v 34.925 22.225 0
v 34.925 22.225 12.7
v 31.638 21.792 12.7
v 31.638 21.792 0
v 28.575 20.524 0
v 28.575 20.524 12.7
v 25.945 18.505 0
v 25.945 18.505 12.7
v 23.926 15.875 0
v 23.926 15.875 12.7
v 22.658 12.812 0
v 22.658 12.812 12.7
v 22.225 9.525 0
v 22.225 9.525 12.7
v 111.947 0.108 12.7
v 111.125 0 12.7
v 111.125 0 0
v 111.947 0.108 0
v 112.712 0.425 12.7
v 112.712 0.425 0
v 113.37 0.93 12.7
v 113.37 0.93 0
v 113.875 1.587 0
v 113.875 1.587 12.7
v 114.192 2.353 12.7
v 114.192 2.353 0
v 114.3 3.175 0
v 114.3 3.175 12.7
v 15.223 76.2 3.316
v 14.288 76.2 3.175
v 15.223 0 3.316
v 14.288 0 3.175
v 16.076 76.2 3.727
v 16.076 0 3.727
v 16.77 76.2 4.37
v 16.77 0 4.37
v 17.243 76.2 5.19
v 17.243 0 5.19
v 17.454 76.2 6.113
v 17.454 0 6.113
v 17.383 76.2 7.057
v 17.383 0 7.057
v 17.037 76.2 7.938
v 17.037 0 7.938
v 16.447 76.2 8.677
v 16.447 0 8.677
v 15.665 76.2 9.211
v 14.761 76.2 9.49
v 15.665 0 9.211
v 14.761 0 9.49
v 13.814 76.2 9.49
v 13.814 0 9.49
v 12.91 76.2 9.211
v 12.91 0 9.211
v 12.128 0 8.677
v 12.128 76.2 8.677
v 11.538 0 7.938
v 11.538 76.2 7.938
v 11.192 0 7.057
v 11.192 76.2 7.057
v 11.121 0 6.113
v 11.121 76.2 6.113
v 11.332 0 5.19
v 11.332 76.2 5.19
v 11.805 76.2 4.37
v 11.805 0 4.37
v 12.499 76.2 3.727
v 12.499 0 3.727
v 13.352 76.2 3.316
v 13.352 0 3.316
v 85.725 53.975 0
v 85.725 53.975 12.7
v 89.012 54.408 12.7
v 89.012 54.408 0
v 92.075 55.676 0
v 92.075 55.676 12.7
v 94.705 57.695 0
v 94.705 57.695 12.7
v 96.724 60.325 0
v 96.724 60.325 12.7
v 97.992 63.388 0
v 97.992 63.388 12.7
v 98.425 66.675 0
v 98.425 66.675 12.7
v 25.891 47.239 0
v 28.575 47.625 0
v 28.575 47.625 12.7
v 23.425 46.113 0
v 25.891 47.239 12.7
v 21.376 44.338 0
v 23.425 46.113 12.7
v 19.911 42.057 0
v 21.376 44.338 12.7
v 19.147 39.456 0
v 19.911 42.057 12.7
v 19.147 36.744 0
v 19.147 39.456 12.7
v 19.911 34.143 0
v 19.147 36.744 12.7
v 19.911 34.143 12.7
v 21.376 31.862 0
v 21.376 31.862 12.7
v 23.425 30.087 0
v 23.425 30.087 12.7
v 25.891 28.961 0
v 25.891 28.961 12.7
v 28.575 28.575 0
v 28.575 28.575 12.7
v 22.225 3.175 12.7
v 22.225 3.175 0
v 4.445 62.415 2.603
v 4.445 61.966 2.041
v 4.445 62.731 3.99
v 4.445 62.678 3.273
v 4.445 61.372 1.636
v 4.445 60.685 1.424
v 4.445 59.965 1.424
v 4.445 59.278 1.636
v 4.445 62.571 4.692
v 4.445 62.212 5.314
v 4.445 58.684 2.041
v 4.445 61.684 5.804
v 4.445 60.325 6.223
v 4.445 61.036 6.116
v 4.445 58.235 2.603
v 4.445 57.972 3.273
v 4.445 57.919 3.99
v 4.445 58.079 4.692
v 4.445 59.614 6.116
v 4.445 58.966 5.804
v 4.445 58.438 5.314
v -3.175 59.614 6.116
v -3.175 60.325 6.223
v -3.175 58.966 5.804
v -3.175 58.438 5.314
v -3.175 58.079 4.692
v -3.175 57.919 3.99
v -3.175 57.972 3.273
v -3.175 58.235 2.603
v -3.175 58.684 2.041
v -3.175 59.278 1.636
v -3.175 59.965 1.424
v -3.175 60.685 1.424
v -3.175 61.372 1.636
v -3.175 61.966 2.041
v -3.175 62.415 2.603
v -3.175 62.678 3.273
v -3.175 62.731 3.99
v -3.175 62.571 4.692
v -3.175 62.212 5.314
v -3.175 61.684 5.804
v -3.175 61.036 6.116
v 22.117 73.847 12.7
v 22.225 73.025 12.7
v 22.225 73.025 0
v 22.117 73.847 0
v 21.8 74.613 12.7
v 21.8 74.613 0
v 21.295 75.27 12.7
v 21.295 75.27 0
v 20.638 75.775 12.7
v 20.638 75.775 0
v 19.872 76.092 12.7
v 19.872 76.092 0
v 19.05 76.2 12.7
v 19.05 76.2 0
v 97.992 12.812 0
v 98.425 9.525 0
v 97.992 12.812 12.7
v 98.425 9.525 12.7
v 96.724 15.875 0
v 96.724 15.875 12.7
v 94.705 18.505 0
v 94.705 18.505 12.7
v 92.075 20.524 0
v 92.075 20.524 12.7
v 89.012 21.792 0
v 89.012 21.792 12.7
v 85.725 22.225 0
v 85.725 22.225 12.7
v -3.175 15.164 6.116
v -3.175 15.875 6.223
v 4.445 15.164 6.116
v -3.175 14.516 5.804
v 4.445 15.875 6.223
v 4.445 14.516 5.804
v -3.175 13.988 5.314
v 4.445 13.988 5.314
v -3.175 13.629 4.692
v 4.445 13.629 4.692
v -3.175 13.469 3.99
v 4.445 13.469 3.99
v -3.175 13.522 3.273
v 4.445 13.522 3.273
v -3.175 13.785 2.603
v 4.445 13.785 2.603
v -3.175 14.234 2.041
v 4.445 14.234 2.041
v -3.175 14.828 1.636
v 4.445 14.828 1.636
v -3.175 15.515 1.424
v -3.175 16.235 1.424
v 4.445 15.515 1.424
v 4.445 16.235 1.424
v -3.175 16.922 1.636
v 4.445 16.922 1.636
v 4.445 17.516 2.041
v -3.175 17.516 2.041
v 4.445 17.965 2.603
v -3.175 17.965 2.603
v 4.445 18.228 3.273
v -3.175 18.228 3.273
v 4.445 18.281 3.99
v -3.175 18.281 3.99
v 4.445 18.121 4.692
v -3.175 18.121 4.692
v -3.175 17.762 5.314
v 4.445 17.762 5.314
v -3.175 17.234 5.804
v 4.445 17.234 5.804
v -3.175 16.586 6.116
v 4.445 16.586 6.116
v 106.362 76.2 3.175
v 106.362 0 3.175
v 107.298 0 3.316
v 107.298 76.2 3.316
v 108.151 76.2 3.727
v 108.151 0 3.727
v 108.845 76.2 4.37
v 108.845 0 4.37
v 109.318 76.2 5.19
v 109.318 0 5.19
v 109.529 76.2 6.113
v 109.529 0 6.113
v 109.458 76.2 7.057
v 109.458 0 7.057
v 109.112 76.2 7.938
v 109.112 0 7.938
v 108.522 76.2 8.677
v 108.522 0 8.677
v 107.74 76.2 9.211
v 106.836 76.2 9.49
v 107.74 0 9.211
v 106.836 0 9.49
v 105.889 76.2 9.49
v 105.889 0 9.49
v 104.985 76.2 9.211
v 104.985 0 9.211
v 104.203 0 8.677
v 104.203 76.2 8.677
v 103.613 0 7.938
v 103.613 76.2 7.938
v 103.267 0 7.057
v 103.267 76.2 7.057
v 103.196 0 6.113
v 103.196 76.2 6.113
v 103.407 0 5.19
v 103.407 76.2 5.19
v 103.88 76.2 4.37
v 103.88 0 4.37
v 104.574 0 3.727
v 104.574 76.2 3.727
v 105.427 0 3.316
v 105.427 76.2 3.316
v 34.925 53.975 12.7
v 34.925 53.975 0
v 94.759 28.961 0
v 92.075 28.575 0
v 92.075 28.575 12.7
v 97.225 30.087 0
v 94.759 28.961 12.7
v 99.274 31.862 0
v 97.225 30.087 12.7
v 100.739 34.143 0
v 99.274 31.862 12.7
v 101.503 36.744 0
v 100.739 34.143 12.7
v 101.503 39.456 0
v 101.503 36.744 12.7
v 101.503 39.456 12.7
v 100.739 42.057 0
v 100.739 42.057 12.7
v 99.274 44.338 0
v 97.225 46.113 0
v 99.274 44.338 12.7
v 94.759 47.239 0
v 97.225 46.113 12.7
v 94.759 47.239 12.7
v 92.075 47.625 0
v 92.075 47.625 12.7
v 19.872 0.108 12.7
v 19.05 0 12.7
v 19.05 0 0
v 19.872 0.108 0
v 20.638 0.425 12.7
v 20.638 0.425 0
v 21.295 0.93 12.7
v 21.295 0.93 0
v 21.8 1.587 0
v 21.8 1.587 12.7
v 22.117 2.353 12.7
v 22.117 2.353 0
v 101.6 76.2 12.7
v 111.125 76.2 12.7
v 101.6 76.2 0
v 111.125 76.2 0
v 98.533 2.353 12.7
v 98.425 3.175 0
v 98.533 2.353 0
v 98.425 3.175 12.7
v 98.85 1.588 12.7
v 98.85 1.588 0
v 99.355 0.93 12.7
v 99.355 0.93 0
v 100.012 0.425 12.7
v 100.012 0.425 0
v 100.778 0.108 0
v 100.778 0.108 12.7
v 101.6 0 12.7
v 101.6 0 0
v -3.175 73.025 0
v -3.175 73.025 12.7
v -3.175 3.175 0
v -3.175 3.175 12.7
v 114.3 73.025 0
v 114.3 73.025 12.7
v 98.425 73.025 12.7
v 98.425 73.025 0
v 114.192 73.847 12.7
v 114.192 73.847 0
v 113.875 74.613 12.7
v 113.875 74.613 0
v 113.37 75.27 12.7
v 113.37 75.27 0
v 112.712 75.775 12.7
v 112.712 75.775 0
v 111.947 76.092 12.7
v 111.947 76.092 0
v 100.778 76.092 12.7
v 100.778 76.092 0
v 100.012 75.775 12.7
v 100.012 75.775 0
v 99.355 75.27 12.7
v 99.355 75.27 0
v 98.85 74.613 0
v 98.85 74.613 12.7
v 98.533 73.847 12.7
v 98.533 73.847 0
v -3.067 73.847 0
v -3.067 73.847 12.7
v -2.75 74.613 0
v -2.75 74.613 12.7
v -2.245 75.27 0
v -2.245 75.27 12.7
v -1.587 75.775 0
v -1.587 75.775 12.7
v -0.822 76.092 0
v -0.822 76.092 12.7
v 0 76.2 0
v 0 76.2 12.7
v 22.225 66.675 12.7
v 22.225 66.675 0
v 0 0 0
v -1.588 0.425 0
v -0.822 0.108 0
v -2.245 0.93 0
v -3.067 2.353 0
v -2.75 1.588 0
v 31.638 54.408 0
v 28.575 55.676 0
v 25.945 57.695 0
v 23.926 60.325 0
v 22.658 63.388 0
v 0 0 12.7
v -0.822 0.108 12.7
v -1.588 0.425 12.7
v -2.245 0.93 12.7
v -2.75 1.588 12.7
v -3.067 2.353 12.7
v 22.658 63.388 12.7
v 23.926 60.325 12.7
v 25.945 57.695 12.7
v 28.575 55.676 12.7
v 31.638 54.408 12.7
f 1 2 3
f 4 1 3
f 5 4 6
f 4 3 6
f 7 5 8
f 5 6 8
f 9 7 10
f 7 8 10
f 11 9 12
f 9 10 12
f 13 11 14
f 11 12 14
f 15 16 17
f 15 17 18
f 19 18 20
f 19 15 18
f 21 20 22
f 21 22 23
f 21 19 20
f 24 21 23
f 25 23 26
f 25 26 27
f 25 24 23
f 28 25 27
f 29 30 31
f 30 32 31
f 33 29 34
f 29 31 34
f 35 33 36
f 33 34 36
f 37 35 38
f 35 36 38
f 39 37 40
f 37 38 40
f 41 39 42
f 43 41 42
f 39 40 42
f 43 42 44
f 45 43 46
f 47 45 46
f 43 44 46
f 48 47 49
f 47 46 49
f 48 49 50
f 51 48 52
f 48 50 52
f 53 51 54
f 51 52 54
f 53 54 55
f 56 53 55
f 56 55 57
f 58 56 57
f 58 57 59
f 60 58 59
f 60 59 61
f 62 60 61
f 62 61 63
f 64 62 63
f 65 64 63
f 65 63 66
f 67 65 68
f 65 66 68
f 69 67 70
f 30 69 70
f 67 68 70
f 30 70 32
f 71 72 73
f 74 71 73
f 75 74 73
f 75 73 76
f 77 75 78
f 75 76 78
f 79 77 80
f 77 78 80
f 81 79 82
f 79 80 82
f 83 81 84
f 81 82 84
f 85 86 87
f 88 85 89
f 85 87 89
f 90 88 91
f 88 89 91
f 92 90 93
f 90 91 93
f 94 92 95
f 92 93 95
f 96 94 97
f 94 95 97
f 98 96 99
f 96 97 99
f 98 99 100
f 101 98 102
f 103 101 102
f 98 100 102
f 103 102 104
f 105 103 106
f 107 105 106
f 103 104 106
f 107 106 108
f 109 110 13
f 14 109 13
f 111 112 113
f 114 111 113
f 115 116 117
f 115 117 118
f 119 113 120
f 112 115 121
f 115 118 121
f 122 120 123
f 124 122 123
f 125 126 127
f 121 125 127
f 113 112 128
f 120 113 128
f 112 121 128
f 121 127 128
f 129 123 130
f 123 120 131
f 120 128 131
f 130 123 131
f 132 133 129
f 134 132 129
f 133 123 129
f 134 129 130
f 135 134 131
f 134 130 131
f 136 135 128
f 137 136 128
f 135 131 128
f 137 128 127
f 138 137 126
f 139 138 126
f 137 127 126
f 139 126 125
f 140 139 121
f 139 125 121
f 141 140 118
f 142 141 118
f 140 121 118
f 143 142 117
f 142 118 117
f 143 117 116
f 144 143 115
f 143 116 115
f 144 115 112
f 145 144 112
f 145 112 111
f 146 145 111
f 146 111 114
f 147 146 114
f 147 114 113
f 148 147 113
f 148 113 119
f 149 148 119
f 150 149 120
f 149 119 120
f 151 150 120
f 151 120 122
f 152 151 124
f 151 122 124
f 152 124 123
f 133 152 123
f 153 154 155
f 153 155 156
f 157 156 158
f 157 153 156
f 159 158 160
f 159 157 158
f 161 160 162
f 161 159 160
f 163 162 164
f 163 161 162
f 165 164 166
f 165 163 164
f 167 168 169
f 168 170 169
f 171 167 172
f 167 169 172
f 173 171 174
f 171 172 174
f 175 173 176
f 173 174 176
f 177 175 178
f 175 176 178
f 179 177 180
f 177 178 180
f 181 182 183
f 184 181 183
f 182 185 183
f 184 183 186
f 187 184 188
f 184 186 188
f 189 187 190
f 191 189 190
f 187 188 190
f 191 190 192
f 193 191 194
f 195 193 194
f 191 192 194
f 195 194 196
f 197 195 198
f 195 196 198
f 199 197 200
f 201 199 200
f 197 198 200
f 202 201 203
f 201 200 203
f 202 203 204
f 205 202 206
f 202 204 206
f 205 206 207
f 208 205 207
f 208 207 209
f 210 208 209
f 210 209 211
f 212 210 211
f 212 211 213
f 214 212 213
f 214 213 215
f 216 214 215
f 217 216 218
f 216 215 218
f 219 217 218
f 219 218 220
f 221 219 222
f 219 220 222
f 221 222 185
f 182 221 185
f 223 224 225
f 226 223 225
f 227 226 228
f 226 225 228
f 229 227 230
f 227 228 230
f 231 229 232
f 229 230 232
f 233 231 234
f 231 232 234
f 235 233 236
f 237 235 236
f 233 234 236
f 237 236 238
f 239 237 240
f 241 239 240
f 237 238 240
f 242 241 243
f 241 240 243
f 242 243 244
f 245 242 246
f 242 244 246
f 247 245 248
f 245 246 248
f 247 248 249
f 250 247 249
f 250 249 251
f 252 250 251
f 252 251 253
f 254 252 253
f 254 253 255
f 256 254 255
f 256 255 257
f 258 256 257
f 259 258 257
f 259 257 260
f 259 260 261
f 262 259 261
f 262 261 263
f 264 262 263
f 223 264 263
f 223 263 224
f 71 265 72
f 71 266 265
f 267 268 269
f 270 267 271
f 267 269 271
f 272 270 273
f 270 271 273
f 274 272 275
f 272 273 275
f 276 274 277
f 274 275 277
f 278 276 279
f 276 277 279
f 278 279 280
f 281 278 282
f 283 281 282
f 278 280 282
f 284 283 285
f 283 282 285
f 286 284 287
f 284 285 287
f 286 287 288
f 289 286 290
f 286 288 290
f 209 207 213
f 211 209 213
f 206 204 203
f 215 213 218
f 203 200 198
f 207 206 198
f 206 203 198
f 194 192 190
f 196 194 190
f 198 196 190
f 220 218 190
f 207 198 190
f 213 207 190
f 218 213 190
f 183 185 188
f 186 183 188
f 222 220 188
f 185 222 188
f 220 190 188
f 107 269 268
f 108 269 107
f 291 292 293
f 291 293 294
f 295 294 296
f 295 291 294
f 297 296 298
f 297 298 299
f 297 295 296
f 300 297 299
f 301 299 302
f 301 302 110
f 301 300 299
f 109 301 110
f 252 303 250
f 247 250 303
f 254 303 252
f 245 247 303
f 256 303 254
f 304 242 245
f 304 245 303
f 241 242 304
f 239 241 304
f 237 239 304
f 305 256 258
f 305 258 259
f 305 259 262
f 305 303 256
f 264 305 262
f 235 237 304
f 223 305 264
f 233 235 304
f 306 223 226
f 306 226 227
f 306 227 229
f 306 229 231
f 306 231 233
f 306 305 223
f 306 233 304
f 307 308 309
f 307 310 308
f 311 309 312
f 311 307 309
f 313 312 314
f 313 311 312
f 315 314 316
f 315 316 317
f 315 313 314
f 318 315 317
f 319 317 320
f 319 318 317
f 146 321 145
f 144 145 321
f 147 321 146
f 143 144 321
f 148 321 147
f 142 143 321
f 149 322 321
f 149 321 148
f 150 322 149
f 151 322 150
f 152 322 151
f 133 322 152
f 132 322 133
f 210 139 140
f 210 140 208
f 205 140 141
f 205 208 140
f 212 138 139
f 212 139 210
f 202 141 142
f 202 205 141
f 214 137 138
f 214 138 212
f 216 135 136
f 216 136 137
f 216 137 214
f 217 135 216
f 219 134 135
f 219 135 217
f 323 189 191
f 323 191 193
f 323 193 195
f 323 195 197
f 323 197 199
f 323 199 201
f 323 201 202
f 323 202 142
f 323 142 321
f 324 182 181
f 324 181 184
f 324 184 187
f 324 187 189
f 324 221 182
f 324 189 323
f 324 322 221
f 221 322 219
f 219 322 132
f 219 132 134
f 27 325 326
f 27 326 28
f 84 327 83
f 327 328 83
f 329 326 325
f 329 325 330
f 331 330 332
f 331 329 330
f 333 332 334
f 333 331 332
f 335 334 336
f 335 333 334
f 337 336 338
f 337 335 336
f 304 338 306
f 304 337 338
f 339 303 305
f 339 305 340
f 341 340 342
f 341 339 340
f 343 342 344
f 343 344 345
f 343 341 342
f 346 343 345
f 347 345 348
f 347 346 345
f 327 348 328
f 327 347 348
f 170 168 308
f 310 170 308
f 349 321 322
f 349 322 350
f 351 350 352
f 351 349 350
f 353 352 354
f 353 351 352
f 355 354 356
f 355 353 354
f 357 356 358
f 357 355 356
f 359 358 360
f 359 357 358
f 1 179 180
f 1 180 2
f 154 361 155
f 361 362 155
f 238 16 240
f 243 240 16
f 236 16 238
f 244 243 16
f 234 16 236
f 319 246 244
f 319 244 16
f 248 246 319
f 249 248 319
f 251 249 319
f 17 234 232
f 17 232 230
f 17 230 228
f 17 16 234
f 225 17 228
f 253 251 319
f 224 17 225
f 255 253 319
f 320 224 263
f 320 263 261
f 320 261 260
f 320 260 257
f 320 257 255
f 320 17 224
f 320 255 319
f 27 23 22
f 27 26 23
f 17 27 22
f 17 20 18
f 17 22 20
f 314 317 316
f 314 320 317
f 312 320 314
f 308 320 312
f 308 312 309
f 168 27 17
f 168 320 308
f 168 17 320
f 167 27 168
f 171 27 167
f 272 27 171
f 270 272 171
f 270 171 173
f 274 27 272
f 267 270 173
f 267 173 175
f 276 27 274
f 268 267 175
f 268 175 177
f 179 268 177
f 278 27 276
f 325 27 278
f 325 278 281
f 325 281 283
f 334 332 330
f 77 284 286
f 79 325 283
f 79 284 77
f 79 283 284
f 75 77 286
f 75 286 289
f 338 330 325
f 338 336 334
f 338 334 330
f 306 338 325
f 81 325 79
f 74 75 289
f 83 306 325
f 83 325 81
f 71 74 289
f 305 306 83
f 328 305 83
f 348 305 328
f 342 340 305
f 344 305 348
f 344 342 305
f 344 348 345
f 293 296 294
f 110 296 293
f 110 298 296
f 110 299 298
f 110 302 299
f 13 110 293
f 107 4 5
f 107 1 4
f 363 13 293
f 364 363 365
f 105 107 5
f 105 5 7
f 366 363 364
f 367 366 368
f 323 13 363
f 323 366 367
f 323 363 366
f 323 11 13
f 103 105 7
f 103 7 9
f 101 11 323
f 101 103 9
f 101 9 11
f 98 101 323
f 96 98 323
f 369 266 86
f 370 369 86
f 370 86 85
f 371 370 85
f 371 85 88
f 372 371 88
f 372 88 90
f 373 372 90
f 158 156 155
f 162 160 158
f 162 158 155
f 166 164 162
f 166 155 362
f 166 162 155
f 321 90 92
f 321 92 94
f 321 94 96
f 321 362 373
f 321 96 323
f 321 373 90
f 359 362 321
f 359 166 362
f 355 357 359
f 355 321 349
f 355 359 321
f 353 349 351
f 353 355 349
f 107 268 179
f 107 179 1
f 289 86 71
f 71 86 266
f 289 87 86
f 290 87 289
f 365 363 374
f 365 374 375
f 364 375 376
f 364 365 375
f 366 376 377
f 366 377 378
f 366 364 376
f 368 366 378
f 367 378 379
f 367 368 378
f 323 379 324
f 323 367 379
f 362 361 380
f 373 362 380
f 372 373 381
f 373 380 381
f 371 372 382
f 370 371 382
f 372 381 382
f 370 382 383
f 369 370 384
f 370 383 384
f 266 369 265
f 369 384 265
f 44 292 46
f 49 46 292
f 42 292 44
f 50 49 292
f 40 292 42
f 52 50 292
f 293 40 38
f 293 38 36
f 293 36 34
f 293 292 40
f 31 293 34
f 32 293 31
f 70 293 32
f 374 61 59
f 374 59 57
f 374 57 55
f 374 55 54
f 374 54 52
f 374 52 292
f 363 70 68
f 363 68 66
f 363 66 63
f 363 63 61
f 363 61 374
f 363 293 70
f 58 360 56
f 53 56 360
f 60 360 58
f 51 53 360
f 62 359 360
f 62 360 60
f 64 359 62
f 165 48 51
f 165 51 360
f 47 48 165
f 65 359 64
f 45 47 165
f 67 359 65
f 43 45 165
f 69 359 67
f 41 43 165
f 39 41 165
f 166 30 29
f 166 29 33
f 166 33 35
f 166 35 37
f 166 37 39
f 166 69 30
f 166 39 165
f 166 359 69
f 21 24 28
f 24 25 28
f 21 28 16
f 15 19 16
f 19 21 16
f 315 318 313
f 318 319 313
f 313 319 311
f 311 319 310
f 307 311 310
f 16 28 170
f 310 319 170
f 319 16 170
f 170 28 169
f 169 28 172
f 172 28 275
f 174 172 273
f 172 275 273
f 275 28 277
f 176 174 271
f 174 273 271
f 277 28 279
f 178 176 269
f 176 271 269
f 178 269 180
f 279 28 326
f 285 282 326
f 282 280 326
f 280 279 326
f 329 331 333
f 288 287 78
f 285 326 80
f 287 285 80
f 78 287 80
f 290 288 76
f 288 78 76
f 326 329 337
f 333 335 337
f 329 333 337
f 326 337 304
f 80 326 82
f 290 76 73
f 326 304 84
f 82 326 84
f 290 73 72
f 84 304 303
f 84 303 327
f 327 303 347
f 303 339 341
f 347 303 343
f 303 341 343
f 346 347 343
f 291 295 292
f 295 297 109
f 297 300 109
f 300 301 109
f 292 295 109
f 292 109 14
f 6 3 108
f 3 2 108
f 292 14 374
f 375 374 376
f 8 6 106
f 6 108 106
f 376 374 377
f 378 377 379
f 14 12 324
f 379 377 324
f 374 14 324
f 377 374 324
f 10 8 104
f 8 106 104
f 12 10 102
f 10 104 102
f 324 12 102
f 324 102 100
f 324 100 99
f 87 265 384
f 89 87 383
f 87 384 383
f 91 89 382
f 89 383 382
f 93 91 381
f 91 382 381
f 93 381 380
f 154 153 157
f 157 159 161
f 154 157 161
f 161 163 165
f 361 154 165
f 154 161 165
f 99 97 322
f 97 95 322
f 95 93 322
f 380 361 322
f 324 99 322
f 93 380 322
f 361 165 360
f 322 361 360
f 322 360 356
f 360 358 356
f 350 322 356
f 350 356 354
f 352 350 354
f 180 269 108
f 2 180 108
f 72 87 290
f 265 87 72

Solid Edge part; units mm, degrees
sketch "Sketch1" plane through (0, 0, 0) normal (0, 0, 1) x (1, 0, 0)
  line L0 (6.35, 0) -> (6.35, 76.2)
  line L1 (6.35, 76.2) -> (22.225, 76.2)
  line L2 (22.225, 53.975) -> (22.225, 76.2)
  line L3 (22.225, 53.975) -> (98.425, 53.975)
  line L4 (98.425, 76.2) -> (98.425, 53.975)
  line L5 (98.425, 76.2) -> (114.3, 76.2)
  line L6 (114.3, 76.2) -> (114.3, 0)
  line L7 (114.3, 0) -> (98.425, 0)
  line L8 (98.425, 22.225) -> (98.425, 0)
  line L9 (98.425, 22.225) -> (22.225, 22.225)
  line L10 (22.225, 0) -> (22.225, 22.225)
  line L11 (22.225, 0) -> (6.35, 0)
  dimension "D1" = 76.2
  dimension "D2" = 15.875
  dimension "D3" = 22.225
  dimension "D4" = 107.95
  dimension "D5" = 31.75
extrude "Protrusion1" add sketch "Sketch1" along normal blind 12.7
hole "Hole_1" at (14.2875, 0, 6.35) direction (0, 1, 0) diameter 6.35 end through all
hole "Hole1" at (106.3625, 0, 6.35) direction (0, 1, 0) diameter 6.35 end through all
sketch "Sketch2" plane through (63.5, 38.1, 12.7) normal (0, 0, 1) x (1, 0, 0)
  line L0 (28.575, -9.525) -> (-34.925, -9.525)
  line L1 (-34.925, 9.525) -> (28.575, 9.525)
  arc A0 (-34.925, -9.525) -> (-34.925, 9.525) centre (-34.925, 0) cw
  arc A1 (28.575, 9.525) -> (28.575, -9.525) centre (28.575, 0) cw
extrude "Cutout1" cut sketch "Sketch2" against normal through all
fillet "Round_1" radius 12.7 4 edges at (22.225, 22.225, 6.35) (22.225, 53.975, 6.35) (98.425, 53.975, 6.35) (98.425, 22.225, 6.35)
sketch "Sketch3" plane through (60.325, 38.1, 12.7) normal (0, 0, 1) x (1, 0, 0)
  line L0 (-63.5, 38.1) -> (-63.5, -38.1)
  line L1 (-63.5, -38.1) -> (-50.8, -38.1)
  line L2 (-50.8, -38.1) -> (-50.8, 38.1)
  line L3 (-50.8, 38.1) -> (-63.5, 38.1)
  dimension "D1" = 9.525
  dimension "D2" = 12.7
extrude "ExtrudedProtrusion_2" add sketch "Sketch3" against normal blind 12.7
fillet "Round_2" radius 3.175 8 edges at (22.225, 0, 6.35) (22.225, 76.2, 6.35) (98.425, 76.2, 6.35) (114.3, 76.2, 6.35) (114.3, 0, 6.35) (98.425, 0, 6.35) (-3.175, 76.2, 6.35) (-3.175, 0, 6.35)
hole "Hole_5" at (-3.175, 15.875, 3.81) direction (1, 0, 0) diameter 4.826 depth 7.62
hole "Hole2" at (-3.175, 60.325, 3.81) direction (1, 0, 0) diameter 4.826 depth 7.62
extrude "ExtrudedCutout_2" [suppressed]
fillet "Round_4" [suppressed]
hole "Hole_9" [suppressed]
properties part number "SR-03" material "Polyethylene, low density"
